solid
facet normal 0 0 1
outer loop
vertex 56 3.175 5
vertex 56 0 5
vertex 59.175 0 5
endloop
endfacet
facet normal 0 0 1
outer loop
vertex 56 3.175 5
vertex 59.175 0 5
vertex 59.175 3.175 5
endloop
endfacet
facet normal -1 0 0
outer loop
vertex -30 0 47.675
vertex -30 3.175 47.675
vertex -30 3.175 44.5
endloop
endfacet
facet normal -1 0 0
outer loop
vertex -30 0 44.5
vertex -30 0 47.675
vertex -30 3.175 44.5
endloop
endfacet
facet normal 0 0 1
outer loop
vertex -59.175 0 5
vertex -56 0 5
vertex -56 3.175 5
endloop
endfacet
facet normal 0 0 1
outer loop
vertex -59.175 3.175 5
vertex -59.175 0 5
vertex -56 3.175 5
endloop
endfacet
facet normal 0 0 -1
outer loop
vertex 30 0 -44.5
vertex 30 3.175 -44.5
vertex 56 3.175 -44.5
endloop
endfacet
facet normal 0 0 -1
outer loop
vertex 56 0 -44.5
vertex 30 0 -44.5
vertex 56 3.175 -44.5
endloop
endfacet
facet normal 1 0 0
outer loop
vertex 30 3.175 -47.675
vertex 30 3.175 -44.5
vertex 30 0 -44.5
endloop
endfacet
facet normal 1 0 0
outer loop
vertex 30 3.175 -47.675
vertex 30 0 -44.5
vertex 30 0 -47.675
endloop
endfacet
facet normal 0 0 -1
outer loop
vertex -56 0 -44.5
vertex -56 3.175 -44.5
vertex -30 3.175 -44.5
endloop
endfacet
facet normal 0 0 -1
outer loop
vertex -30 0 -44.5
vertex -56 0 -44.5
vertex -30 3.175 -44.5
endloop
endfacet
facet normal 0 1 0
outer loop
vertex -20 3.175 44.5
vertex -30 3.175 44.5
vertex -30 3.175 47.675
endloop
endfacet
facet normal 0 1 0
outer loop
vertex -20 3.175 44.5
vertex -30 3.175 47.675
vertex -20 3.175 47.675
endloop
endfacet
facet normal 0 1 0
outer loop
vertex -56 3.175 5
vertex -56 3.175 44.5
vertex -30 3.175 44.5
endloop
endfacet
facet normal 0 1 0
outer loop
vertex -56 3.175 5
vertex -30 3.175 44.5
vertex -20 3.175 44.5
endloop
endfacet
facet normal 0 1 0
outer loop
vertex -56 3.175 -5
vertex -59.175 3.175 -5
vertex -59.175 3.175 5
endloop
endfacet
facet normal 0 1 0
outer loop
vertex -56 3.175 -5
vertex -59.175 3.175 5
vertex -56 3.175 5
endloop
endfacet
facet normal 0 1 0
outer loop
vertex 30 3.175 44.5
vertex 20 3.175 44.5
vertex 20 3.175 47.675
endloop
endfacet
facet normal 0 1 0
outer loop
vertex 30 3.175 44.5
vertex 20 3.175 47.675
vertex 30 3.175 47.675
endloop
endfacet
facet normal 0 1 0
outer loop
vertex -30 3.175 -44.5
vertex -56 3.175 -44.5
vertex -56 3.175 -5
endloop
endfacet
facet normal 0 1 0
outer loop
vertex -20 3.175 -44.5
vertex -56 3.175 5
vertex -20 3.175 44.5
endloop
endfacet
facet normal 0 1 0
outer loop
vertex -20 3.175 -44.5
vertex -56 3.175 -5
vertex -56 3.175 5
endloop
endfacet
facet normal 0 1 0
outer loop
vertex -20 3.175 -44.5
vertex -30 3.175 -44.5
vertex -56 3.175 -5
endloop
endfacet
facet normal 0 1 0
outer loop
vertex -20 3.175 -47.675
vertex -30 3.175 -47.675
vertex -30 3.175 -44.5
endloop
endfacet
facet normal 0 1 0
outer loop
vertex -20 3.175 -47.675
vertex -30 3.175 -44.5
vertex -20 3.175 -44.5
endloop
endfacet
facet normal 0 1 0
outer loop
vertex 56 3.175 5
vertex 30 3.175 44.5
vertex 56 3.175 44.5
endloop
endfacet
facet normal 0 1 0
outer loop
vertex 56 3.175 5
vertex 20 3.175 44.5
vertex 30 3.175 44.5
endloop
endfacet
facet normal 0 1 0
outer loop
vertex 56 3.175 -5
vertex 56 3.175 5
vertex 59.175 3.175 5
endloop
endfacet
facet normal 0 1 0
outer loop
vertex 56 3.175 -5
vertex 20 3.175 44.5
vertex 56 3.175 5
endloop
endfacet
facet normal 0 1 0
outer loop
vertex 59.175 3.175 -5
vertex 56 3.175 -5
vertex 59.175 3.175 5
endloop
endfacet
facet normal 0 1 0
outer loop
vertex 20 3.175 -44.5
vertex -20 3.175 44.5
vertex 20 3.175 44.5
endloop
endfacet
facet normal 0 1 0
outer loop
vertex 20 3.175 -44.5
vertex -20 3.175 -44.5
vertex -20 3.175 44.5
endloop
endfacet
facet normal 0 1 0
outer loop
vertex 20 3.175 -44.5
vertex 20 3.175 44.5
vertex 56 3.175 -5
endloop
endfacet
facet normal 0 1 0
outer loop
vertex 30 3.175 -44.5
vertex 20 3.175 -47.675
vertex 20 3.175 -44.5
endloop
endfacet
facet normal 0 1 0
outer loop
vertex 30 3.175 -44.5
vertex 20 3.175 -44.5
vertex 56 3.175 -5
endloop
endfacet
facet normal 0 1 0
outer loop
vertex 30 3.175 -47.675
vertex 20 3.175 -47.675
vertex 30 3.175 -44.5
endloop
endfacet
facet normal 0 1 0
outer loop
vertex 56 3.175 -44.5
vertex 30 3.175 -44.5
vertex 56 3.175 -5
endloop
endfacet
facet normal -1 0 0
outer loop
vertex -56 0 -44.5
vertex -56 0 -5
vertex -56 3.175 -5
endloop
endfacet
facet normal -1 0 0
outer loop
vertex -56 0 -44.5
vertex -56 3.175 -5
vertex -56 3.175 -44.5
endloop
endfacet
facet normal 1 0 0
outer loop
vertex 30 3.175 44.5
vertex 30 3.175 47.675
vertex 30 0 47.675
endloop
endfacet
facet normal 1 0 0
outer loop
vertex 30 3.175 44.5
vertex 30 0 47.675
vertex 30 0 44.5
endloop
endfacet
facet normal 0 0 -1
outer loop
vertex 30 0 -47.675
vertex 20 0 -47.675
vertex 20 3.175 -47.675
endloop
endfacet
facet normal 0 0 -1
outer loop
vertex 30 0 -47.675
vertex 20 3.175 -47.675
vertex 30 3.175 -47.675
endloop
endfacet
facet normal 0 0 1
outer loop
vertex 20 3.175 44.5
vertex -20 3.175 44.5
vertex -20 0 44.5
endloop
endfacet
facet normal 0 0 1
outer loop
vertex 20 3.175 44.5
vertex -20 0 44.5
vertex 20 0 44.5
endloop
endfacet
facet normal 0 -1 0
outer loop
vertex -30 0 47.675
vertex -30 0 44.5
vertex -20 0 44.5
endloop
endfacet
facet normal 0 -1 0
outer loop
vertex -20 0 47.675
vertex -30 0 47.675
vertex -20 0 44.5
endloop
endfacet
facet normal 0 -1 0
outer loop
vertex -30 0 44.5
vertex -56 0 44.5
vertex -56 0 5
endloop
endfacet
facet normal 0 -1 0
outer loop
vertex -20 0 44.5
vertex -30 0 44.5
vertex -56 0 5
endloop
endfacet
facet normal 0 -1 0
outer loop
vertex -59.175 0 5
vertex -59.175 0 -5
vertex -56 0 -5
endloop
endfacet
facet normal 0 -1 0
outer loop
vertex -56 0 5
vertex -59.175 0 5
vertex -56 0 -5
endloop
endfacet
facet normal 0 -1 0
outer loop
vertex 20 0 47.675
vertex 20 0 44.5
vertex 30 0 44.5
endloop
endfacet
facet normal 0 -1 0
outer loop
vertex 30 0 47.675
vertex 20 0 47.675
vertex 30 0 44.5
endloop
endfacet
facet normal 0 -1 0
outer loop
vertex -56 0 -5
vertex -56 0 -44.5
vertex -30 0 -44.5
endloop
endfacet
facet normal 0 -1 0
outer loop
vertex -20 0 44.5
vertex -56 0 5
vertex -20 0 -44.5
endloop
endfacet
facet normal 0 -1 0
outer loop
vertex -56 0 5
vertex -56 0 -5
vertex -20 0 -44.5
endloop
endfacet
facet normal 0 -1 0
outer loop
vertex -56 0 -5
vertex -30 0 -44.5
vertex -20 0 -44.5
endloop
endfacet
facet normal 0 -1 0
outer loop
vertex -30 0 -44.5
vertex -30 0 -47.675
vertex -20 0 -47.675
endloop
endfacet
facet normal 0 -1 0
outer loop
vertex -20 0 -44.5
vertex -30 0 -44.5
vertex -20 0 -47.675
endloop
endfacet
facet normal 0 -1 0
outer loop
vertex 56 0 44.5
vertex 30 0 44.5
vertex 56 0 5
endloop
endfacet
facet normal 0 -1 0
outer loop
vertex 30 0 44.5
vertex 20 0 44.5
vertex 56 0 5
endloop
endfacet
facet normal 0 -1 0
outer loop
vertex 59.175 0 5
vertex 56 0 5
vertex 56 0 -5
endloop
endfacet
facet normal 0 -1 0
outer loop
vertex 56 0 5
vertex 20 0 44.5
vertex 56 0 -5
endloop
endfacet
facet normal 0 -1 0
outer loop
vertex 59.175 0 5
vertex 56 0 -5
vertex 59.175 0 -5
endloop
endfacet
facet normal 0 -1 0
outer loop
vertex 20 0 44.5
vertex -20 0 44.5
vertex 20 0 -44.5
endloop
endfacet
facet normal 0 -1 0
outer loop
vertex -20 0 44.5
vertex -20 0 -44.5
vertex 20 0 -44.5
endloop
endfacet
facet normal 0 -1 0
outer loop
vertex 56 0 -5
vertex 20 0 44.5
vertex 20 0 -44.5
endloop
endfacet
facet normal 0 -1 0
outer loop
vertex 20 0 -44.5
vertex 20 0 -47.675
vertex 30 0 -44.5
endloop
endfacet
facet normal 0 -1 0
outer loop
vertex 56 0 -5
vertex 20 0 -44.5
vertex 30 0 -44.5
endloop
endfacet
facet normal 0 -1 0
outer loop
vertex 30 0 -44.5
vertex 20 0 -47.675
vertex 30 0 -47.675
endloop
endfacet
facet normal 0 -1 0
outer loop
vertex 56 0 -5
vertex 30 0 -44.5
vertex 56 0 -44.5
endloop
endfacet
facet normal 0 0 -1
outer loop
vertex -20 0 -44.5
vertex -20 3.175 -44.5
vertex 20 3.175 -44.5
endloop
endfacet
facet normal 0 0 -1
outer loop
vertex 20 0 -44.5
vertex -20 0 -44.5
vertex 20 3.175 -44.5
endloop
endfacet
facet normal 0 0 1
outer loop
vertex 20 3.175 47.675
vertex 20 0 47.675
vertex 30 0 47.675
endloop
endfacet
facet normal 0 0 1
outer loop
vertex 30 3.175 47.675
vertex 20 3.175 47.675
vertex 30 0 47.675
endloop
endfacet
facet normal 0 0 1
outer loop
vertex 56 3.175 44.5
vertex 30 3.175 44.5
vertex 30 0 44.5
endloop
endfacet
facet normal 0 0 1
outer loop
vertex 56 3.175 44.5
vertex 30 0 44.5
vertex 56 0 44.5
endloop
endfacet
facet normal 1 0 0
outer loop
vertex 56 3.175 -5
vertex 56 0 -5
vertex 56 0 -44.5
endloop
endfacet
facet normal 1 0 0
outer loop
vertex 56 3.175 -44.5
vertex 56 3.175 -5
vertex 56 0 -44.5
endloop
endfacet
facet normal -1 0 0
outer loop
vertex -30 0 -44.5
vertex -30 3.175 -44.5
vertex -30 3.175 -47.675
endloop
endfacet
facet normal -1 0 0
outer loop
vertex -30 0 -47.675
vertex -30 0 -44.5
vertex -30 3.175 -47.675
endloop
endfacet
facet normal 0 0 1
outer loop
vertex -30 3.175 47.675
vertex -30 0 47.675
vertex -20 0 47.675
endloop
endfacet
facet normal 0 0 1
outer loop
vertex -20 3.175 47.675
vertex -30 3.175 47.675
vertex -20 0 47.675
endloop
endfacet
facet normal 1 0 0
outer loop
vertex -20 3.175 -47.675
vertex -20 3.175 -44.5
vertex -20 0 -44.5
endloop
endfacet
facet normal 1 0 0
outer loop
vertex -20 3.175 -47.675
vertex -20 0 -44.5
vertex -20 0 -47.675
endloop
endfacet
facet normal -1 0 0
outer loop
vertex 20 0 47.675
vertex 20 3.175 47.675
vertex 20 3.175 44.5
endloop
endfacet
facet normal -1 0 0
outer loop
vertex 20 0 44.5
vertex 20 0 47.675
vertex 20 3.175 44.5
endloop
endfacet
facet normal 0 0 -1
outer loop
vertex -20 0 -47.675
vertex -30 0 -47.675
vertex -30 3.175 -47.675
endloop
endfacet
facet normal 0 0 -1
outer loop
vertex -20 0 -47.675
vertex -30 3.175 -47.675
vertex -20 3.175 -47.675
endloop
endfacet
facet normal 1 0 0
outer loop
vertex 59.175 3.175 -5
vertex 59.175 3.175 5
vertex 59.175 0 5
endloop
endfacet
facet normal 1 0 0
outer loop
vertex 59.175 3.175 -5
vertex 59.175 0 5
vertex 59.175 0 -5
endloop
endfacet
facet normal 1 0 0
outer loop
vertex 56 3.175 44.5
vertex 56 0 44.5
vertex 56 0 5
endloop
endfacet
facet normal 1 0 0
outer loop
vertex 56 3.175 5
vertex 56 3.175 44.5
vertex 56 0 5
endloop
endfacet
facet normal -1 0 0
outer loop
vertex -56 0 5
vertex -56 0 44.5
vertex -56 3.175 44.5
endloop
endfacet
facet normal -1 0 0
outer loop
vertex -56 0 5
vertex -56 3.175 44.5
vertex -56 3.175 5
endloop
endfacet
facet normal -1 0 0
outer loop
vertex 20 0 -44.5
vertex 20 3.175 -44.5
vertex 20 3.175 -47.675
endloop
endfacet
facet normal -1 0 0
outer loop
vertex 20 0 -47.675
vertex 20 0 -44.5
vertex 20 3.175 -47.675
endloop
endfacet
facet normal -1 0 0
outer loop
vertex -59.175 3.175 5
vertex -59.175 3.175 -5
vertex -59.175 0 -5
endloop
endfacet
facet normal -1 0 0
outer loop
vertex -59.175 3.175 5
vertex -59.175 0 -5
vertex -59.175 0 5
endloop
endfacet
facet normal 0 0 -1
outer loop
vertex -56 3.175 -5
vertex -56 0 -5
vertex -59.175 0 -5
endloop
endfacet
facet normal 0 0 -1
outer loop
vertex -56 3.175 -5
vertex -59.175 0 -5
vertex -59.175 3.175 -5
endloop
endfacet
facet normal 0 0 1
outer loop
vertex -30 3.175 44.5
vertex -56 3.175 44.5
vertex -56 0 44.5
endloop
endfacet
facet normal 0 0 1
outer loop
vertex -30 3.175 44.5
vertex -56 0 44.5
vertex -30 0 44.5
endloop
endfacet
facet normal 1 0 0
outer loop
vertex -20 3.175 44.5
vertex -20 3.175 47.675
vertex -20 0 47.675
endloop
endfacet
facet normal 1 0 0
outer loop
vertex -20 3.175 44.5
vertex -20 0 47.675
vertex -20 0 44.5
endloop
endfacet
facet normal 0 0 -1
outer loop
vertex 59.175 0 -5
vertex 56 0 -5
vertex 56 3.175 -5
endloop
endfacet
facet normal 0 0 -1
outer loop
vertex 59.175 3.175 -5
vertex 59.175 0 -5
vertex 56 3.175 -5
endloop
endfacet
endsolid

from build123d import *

# Parameters (mm, degrees)
SKETCH1_W           = 112
SKETCH1_H           = 95.35
BOSS_EXTRUDE1_DEPTH = 3.175
SKETCH2_W           = 40
SKETCH2_H           = 3.175
SKETCH2_W_2         = 26
CUT_EXTRUDE1_DEPTH  = 74.613763998
SKETCH4_W           = 10
SKETCH4_H           = 3.175
BOSS_EXTRUDE2_DEPTH = 3.175
SKETCH5_W           = 10
SKETCH5_H           = 3.175
BOSS_EXTRUDE3_DEPTH = 3.175


with BuildPart() as part:
    # Sketch1 → Boss-Extrude1 (new body)
    with BuildSketch(Plane(origin=(0, 0, 0), x_dir=(1, 0, 0), z_dir=(0, 1, 0))):
        Rectangle(SKETCH1_W, SKETCH1_H)
    extrude(amount=BOSS_EXTRUDE1_DEPTH)

    # Sketch2 → Cut-Extrude1 (cut, through all)
    with BuildSketch(Plane(origin=(0, 3.175, 0), x_dir=(1, 0, 0), z_dir=(0, 1, 0))):
        with Locations((0, 46.0875)):
            Rectangle(SKETCH2_W, SKETCH2_H)
        with Locations((43, 46.0875)):
            Rectangle(SKETCH2_W_2, SKETCH2_H)
        with Locations((-43, 46.0875)):
            Rectangle(SKETCH2_W_2, SKETCH2_H)
        with Locations((0, -46.0875)):
            Rectangle(SKETCH2_W, SKETCH2_H)
        with Locations((-43, -46.0875)):
            Rectangle(SKETCH2_W_2, SKETCH2_H)
        with Locations((43, -46.0875)):
            Rectangle(SKETCH2_W_2, SKETCH2_H)
    extrude(amount=-CUT_EXTRUDE1_DEPTH, mode=Mode.SUBTRACT)

    # Sketch4 → Boss-Extrude2 (add)
    with BuildSketch(Plane.ZY.offset(56)):
        with Locations((0, 1.5875)):
            Rectangle(SKETCH4_W, SKETCH4_H)
    extrude(amount=BOSS_EXTRUDE2_DEPTH)

    # Sketch5 → Boss-Extrude3 (add)
    with BuildSketch(Plane(origin=(56, 0, 0), x_dir=(0, 0, -1), z_dir=(1, 0, 0))):
        with Locations((0, 1.5875)):
            Rectangle(SKETCH5_W, SKETCH5_H)
    extrude(amount=BOSS_EXTRUDE3_DEPTH)


solid = part.part
